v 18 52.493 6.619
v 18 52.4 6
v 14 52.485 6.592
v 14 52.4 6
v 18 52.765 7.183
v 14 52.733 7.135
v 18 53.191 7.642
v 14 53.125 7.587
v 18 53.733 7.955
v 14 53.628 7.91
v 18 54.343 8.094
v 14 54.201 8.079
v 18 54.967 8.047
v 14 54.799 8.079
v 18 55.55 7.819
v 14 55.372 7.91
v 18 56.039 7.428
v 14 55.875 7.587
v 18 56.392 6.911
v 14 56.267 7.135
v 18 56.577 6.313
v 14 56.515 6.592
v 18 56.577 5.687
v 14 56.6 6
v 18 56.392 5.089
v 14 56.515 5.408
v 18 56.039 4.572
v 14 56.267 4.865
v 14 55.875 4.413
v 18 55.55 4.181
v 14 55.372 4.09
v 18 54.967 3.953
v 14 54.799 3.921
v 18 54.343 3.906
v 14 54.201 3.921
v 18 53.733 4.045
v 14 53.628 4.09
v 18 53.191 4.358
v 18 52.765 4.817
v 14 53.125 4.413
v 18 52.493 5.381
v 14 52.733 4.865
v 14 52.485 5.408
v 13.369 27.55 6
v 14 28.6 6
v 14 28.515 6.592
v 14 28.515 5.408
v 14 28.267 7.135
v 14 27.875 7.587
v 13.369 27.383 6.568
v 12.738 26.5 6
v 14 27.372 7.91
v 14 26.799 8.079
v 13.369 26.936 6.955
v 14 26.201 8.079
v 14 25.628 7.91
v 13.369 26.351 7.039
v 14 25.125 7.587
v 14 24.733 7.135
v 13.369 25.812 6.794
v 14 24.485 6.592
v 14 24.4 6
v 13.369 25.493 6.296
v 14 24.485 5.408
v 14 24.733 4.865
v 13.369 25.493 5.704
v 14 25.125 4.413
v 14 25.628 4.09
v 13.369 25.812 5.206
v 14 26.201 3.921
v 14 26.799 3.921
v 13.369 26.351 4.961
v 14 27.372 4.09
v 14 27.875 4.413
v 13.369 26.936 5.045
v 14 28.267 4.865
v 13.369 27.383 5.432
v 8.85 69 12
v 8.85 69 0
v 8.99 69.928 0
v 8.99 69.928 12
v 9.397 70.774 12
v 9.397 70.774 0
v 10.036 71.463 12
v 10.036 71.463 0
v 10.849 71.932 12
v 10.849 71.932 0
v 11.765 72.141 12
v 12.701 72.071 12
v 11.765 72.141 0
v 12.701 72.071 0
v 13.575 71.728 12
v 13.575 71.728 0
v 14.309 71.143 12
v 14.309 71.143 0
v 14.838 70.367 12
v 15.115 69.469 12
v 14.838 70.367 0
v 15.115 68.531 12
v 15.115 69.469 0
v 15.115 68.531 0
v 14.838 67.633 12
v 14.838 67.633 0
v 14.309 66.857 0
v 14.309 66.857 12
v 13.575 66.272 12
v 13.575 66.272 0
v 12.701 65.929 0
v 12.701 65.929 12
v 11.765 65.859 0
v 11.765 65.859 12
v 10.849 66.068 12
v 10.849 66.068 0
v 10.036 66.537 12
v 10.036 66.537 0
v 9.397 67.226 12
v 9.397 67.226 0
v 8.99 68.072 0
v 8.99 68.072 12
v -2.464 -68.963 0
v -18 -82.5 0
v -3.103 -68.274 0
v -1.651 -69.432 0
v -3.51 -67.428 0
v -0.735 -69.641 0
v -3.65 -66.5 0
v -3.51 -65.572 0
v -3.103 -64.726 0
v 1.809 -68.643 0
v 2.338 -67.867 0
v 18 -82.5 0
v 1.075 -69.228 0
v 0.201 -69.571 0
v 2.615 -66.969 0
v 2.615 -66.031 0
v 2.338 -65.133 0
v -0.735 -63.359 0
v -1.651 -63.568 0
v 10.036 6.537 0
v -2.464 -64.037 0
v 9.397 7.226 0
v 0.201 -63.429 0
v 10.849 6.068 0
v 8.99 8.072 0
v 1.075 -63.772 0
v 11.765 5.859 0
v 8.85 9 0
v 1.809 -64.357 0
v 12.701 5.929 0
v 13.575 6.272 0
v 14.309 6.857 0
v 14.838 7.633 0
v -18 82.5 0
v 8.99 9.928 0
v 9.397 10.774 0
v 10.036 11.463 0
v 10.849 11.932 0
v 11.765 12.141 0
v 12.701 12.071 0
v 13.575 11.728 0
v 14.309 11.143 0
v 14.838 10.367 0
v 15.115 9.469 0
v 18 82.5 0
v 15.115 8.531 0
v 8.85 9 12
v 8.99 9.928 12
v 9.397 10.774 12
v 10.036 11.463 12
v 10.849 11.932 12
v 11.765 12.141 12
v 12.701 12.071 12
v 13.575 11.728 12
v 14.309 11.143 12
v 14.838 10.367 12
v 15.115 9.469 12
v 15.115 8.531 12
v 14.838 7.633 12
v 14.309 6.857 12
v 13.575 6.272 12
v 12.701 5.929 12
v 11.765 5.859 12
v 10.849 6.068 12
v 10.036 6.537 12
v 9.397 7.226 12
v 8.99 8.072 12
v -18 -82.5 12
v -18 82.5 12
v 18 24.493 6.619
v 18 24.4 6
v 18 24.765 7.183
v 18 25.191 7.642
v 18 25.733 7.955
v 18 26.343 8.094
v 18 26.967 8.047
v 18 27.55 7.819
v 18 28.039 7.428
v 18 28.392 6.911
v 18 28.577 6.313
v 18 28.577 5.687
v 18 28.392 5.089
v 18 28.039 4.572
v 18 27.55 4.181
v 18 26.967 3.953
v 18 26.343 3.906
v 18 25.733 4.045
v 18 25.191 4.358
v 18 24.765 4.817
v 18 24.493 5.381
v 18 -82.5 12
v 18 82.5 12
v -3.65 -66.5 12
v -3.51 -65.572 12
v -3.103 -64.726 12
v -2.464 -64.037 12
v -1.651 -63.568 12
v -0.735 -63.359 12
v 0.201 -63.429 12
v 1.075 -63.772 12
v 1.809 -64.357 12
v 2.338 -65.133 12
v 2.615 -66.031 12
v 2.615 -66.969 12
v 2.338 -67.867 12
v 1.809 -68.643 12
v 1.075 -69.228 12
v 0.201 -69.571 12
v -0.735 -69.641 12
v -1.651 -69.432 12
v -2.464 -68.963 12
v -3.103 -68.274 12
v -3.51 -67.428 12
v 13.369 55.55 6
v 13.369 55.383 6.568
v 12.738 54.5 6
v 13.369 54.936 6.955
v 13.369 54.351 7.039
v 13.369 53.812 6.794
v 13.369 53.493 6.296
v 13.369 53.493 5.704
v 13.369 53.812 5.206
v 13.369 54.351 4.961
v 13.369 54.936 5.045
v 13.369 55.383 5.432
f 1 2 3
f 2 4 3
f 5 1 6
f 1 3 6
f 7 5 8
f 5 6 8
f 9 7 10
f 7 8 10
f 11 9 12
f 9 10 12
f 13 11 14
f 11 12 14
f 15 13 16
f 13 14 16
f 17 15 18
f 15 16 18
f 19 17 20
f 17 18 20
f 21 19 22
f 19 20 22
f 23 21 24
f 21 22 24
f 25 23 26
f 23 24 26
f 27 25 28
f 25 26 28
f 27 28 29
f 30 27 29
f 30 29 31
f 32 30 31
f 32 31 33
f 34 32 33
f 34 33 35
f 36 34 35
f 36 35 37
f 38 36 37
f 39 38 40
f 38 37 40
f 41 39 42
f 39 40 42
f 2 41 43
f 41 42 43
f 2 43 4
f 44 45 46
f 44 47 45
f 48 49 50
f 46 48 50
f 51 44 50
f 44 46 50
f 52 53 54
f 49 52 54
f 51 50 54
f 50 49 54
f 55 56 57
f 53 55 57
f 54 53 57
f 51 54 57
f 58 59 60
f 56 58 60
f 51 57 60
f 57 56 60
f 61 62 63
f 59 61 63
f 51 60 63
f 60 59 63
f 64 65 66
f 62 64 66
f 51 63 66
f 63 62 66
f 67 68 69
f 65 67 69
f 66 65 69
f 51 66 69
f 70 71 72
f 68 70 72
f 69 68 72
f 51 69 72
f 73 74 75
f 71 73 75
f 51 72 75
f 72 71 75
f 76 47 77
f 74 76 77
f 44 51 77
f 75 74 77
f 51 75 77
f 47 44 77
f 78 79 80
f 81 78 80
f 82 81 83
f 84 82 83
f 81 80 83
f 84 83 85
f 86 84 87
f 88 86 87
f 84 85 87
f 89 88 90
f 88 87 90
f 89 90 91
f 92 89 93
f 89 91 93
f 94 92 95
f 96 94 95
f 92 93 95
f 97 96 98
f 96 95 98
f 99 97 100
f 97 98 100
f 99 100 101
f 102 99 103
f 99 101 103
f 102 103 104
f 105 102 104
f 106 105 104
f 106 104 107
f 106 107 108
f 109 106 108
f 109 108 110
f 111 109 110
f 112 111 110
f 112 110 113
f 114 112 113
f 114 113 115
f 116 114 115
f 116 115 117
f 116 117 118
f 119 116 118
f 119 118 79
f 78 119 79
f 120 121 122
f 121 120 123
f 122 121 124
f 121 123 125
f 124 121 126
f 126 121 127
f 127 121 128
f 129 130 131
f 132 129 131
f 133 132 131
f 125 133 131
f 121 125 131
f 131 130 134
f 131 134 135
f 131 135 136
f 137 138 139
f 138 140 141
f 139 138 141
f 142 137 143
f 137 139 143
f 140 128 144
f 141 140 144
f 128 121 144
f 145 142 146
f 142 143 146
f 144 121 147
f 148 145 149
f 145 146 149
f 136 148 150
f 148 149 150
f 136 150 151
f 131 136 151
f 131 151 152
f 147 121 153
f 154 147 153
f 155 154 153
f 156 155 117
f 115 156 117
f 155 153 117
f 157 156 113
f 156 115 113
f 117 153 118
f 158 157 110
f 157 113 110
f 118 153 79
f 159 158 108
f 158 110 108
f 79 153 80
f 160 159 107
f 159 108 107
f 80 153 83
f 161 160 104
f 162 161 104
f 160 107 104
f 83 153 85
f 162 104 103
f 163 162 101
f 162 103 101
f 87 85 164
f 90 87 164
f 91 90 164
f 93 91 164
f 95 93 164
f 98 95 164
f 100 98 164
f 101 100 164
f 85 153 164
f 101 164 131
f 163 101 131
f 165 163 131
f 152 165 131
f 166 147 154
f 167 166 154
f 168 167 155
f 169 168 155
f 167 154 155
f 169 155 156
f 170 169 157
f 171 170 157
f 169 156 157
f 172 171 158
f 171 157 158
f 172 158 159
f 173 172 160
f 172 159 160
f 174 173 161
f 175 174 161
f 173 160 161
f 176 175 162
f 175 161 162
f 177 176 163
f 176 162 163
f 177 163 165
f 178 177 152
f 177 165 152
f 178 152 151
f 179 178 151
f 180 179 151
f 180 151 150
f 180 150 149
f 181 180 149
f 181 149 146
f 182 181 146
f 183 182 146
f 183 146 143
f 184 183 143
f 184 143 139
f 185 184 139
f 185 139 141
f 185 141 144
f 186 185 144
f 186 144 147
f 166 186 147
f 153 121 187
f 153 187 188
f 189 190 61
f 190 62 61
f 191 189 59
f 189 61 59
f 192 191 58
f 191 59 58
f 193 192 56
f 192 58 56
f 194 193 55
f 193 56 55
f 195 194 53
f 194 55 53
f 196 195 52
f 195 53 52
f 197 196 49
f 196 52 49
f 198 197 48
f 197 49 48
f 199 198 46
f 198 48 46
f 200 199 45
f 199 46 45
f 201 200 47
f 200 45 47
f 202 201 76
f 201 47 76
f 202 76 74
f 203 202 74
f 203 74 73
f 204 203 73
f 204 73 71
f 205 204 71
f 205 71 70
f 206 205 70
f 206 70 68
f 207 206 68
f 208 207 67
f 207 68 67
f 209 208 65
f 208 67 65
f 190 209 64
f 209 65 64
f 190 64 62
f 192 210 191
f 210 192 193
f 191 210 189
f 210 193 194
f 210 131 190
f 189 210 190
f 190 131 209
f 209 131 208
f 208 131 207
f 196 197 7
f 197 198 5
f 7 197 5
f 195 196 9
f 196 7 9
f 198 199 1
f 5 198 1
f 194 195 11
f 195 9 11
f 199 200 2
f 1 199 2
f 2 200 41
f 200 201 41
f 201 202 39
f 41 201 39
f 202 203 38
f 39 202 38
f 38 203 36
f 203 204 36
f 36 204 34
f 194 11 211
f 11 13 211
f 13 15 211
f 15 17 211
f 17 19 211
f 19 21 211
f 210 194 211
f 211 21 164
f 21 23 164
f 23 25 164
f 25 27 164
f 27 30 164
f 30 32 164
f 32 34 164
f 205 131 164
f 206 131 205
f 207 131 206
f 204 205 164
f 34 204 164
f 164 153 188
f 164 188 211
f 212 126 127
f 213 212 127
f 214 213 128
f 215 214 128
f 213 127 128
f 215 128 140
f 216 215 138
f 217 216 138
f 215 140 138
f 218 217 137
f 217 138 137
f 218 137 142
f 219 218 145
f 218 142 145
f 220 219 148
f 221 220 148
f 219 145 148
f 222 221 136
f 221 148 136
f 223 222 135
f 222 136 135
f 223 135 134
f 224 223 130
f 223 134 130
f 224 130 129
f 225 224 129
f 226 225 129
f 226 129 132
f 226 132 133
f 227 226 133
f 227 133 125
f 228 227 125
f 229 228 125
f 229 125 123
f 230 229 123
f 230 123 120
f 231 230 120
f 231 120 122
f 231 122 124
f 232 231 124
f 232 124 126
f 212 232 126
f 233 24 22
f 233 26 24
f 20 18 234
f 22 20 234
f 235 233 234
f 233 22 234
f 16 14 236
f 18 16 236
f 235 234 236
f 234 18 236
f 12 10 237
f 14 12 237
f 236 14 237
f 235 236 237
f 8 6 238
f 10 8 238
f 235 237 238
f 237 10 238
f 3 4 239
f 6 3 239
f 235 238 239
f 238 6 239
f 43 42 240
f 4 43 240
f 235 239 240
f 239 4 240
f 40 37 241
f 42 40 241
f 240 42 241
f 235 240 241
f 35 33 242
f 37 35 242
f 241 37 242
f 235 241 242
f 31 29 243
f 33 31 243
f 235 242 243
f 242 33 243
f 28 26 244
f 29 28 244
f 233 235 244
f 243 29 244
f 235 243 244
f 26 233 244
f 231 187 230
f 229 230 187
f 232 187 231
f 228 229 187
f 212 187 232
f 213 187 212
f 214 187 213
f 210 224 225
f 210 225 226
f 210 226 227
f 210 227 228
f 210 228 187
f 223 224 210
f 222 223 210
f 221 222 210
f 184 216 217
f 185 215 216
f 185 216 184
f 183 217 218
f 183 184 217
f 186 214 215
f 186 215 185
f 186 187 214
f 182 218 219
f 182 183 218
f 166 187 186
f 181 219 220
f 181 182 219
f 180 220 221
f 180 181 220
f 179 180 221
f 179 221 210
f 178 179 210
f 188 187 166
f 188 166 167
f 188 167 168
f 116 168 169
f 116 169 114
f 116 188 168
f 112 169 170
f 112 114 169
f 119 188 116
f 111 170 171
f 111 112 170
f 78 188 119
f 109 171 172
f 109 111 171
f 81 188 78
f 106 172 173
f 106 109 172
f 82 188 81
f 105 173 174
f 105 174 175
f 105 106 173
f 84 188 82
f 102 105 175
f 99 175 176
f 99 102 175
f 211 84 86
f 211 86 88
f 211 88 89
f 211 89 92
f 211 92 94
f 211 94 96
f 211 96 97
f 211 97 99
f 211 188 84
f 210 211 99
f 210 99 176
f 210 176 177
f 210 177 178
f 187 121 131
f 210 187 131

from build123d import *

# Parameters (mm, degrees)
F0_W     = 36
F0_H     = 165
F1_DEPTH = 12
F3_D     = 6.3
F3_DEPTH = 40
F3_TIP   = 1.8927109499
F5_D     = 4.2
F5_DEPTH = 4
F5_TIP   = 1.2618073


with BuildPart() as f1:
    # F0 (on Top) → F1 (new body)
    with BuildSketch(Plane.XY):
        Rectangle(F0_W, F0_H)
    extrude(amount=F1_DEPTH)

    # F3
    with Locations(Plane.XY.offset(12)):
        with Locations((-0.5, -66.5), (12, 9), (12, 69)):
            Hole(F3_D / 2, depth=F3_DEPTH)
            with Locations((0, 0, -(F3_DEPTH + F3_TIP / 2))):  # 118° drill point
                Cone(0, F3_D / 2, F3_TIP, mode=Mode.SUBTRACT)

    # F5
    with Locations(Plane.YZ.offset(18)):
        with Locations((26.5, 6), (54.5, 6)):
            Hole(F5_D / 2, depth=F5_DEPTH)
            with Locations((0, 0, -(F5_DEPTH + F5_TIP / 2))):  # 118° drill point
                Cone(0, F5_D / 2, F5_TIP, mode=Mode.SUBTRACT)


solid = f1.part
